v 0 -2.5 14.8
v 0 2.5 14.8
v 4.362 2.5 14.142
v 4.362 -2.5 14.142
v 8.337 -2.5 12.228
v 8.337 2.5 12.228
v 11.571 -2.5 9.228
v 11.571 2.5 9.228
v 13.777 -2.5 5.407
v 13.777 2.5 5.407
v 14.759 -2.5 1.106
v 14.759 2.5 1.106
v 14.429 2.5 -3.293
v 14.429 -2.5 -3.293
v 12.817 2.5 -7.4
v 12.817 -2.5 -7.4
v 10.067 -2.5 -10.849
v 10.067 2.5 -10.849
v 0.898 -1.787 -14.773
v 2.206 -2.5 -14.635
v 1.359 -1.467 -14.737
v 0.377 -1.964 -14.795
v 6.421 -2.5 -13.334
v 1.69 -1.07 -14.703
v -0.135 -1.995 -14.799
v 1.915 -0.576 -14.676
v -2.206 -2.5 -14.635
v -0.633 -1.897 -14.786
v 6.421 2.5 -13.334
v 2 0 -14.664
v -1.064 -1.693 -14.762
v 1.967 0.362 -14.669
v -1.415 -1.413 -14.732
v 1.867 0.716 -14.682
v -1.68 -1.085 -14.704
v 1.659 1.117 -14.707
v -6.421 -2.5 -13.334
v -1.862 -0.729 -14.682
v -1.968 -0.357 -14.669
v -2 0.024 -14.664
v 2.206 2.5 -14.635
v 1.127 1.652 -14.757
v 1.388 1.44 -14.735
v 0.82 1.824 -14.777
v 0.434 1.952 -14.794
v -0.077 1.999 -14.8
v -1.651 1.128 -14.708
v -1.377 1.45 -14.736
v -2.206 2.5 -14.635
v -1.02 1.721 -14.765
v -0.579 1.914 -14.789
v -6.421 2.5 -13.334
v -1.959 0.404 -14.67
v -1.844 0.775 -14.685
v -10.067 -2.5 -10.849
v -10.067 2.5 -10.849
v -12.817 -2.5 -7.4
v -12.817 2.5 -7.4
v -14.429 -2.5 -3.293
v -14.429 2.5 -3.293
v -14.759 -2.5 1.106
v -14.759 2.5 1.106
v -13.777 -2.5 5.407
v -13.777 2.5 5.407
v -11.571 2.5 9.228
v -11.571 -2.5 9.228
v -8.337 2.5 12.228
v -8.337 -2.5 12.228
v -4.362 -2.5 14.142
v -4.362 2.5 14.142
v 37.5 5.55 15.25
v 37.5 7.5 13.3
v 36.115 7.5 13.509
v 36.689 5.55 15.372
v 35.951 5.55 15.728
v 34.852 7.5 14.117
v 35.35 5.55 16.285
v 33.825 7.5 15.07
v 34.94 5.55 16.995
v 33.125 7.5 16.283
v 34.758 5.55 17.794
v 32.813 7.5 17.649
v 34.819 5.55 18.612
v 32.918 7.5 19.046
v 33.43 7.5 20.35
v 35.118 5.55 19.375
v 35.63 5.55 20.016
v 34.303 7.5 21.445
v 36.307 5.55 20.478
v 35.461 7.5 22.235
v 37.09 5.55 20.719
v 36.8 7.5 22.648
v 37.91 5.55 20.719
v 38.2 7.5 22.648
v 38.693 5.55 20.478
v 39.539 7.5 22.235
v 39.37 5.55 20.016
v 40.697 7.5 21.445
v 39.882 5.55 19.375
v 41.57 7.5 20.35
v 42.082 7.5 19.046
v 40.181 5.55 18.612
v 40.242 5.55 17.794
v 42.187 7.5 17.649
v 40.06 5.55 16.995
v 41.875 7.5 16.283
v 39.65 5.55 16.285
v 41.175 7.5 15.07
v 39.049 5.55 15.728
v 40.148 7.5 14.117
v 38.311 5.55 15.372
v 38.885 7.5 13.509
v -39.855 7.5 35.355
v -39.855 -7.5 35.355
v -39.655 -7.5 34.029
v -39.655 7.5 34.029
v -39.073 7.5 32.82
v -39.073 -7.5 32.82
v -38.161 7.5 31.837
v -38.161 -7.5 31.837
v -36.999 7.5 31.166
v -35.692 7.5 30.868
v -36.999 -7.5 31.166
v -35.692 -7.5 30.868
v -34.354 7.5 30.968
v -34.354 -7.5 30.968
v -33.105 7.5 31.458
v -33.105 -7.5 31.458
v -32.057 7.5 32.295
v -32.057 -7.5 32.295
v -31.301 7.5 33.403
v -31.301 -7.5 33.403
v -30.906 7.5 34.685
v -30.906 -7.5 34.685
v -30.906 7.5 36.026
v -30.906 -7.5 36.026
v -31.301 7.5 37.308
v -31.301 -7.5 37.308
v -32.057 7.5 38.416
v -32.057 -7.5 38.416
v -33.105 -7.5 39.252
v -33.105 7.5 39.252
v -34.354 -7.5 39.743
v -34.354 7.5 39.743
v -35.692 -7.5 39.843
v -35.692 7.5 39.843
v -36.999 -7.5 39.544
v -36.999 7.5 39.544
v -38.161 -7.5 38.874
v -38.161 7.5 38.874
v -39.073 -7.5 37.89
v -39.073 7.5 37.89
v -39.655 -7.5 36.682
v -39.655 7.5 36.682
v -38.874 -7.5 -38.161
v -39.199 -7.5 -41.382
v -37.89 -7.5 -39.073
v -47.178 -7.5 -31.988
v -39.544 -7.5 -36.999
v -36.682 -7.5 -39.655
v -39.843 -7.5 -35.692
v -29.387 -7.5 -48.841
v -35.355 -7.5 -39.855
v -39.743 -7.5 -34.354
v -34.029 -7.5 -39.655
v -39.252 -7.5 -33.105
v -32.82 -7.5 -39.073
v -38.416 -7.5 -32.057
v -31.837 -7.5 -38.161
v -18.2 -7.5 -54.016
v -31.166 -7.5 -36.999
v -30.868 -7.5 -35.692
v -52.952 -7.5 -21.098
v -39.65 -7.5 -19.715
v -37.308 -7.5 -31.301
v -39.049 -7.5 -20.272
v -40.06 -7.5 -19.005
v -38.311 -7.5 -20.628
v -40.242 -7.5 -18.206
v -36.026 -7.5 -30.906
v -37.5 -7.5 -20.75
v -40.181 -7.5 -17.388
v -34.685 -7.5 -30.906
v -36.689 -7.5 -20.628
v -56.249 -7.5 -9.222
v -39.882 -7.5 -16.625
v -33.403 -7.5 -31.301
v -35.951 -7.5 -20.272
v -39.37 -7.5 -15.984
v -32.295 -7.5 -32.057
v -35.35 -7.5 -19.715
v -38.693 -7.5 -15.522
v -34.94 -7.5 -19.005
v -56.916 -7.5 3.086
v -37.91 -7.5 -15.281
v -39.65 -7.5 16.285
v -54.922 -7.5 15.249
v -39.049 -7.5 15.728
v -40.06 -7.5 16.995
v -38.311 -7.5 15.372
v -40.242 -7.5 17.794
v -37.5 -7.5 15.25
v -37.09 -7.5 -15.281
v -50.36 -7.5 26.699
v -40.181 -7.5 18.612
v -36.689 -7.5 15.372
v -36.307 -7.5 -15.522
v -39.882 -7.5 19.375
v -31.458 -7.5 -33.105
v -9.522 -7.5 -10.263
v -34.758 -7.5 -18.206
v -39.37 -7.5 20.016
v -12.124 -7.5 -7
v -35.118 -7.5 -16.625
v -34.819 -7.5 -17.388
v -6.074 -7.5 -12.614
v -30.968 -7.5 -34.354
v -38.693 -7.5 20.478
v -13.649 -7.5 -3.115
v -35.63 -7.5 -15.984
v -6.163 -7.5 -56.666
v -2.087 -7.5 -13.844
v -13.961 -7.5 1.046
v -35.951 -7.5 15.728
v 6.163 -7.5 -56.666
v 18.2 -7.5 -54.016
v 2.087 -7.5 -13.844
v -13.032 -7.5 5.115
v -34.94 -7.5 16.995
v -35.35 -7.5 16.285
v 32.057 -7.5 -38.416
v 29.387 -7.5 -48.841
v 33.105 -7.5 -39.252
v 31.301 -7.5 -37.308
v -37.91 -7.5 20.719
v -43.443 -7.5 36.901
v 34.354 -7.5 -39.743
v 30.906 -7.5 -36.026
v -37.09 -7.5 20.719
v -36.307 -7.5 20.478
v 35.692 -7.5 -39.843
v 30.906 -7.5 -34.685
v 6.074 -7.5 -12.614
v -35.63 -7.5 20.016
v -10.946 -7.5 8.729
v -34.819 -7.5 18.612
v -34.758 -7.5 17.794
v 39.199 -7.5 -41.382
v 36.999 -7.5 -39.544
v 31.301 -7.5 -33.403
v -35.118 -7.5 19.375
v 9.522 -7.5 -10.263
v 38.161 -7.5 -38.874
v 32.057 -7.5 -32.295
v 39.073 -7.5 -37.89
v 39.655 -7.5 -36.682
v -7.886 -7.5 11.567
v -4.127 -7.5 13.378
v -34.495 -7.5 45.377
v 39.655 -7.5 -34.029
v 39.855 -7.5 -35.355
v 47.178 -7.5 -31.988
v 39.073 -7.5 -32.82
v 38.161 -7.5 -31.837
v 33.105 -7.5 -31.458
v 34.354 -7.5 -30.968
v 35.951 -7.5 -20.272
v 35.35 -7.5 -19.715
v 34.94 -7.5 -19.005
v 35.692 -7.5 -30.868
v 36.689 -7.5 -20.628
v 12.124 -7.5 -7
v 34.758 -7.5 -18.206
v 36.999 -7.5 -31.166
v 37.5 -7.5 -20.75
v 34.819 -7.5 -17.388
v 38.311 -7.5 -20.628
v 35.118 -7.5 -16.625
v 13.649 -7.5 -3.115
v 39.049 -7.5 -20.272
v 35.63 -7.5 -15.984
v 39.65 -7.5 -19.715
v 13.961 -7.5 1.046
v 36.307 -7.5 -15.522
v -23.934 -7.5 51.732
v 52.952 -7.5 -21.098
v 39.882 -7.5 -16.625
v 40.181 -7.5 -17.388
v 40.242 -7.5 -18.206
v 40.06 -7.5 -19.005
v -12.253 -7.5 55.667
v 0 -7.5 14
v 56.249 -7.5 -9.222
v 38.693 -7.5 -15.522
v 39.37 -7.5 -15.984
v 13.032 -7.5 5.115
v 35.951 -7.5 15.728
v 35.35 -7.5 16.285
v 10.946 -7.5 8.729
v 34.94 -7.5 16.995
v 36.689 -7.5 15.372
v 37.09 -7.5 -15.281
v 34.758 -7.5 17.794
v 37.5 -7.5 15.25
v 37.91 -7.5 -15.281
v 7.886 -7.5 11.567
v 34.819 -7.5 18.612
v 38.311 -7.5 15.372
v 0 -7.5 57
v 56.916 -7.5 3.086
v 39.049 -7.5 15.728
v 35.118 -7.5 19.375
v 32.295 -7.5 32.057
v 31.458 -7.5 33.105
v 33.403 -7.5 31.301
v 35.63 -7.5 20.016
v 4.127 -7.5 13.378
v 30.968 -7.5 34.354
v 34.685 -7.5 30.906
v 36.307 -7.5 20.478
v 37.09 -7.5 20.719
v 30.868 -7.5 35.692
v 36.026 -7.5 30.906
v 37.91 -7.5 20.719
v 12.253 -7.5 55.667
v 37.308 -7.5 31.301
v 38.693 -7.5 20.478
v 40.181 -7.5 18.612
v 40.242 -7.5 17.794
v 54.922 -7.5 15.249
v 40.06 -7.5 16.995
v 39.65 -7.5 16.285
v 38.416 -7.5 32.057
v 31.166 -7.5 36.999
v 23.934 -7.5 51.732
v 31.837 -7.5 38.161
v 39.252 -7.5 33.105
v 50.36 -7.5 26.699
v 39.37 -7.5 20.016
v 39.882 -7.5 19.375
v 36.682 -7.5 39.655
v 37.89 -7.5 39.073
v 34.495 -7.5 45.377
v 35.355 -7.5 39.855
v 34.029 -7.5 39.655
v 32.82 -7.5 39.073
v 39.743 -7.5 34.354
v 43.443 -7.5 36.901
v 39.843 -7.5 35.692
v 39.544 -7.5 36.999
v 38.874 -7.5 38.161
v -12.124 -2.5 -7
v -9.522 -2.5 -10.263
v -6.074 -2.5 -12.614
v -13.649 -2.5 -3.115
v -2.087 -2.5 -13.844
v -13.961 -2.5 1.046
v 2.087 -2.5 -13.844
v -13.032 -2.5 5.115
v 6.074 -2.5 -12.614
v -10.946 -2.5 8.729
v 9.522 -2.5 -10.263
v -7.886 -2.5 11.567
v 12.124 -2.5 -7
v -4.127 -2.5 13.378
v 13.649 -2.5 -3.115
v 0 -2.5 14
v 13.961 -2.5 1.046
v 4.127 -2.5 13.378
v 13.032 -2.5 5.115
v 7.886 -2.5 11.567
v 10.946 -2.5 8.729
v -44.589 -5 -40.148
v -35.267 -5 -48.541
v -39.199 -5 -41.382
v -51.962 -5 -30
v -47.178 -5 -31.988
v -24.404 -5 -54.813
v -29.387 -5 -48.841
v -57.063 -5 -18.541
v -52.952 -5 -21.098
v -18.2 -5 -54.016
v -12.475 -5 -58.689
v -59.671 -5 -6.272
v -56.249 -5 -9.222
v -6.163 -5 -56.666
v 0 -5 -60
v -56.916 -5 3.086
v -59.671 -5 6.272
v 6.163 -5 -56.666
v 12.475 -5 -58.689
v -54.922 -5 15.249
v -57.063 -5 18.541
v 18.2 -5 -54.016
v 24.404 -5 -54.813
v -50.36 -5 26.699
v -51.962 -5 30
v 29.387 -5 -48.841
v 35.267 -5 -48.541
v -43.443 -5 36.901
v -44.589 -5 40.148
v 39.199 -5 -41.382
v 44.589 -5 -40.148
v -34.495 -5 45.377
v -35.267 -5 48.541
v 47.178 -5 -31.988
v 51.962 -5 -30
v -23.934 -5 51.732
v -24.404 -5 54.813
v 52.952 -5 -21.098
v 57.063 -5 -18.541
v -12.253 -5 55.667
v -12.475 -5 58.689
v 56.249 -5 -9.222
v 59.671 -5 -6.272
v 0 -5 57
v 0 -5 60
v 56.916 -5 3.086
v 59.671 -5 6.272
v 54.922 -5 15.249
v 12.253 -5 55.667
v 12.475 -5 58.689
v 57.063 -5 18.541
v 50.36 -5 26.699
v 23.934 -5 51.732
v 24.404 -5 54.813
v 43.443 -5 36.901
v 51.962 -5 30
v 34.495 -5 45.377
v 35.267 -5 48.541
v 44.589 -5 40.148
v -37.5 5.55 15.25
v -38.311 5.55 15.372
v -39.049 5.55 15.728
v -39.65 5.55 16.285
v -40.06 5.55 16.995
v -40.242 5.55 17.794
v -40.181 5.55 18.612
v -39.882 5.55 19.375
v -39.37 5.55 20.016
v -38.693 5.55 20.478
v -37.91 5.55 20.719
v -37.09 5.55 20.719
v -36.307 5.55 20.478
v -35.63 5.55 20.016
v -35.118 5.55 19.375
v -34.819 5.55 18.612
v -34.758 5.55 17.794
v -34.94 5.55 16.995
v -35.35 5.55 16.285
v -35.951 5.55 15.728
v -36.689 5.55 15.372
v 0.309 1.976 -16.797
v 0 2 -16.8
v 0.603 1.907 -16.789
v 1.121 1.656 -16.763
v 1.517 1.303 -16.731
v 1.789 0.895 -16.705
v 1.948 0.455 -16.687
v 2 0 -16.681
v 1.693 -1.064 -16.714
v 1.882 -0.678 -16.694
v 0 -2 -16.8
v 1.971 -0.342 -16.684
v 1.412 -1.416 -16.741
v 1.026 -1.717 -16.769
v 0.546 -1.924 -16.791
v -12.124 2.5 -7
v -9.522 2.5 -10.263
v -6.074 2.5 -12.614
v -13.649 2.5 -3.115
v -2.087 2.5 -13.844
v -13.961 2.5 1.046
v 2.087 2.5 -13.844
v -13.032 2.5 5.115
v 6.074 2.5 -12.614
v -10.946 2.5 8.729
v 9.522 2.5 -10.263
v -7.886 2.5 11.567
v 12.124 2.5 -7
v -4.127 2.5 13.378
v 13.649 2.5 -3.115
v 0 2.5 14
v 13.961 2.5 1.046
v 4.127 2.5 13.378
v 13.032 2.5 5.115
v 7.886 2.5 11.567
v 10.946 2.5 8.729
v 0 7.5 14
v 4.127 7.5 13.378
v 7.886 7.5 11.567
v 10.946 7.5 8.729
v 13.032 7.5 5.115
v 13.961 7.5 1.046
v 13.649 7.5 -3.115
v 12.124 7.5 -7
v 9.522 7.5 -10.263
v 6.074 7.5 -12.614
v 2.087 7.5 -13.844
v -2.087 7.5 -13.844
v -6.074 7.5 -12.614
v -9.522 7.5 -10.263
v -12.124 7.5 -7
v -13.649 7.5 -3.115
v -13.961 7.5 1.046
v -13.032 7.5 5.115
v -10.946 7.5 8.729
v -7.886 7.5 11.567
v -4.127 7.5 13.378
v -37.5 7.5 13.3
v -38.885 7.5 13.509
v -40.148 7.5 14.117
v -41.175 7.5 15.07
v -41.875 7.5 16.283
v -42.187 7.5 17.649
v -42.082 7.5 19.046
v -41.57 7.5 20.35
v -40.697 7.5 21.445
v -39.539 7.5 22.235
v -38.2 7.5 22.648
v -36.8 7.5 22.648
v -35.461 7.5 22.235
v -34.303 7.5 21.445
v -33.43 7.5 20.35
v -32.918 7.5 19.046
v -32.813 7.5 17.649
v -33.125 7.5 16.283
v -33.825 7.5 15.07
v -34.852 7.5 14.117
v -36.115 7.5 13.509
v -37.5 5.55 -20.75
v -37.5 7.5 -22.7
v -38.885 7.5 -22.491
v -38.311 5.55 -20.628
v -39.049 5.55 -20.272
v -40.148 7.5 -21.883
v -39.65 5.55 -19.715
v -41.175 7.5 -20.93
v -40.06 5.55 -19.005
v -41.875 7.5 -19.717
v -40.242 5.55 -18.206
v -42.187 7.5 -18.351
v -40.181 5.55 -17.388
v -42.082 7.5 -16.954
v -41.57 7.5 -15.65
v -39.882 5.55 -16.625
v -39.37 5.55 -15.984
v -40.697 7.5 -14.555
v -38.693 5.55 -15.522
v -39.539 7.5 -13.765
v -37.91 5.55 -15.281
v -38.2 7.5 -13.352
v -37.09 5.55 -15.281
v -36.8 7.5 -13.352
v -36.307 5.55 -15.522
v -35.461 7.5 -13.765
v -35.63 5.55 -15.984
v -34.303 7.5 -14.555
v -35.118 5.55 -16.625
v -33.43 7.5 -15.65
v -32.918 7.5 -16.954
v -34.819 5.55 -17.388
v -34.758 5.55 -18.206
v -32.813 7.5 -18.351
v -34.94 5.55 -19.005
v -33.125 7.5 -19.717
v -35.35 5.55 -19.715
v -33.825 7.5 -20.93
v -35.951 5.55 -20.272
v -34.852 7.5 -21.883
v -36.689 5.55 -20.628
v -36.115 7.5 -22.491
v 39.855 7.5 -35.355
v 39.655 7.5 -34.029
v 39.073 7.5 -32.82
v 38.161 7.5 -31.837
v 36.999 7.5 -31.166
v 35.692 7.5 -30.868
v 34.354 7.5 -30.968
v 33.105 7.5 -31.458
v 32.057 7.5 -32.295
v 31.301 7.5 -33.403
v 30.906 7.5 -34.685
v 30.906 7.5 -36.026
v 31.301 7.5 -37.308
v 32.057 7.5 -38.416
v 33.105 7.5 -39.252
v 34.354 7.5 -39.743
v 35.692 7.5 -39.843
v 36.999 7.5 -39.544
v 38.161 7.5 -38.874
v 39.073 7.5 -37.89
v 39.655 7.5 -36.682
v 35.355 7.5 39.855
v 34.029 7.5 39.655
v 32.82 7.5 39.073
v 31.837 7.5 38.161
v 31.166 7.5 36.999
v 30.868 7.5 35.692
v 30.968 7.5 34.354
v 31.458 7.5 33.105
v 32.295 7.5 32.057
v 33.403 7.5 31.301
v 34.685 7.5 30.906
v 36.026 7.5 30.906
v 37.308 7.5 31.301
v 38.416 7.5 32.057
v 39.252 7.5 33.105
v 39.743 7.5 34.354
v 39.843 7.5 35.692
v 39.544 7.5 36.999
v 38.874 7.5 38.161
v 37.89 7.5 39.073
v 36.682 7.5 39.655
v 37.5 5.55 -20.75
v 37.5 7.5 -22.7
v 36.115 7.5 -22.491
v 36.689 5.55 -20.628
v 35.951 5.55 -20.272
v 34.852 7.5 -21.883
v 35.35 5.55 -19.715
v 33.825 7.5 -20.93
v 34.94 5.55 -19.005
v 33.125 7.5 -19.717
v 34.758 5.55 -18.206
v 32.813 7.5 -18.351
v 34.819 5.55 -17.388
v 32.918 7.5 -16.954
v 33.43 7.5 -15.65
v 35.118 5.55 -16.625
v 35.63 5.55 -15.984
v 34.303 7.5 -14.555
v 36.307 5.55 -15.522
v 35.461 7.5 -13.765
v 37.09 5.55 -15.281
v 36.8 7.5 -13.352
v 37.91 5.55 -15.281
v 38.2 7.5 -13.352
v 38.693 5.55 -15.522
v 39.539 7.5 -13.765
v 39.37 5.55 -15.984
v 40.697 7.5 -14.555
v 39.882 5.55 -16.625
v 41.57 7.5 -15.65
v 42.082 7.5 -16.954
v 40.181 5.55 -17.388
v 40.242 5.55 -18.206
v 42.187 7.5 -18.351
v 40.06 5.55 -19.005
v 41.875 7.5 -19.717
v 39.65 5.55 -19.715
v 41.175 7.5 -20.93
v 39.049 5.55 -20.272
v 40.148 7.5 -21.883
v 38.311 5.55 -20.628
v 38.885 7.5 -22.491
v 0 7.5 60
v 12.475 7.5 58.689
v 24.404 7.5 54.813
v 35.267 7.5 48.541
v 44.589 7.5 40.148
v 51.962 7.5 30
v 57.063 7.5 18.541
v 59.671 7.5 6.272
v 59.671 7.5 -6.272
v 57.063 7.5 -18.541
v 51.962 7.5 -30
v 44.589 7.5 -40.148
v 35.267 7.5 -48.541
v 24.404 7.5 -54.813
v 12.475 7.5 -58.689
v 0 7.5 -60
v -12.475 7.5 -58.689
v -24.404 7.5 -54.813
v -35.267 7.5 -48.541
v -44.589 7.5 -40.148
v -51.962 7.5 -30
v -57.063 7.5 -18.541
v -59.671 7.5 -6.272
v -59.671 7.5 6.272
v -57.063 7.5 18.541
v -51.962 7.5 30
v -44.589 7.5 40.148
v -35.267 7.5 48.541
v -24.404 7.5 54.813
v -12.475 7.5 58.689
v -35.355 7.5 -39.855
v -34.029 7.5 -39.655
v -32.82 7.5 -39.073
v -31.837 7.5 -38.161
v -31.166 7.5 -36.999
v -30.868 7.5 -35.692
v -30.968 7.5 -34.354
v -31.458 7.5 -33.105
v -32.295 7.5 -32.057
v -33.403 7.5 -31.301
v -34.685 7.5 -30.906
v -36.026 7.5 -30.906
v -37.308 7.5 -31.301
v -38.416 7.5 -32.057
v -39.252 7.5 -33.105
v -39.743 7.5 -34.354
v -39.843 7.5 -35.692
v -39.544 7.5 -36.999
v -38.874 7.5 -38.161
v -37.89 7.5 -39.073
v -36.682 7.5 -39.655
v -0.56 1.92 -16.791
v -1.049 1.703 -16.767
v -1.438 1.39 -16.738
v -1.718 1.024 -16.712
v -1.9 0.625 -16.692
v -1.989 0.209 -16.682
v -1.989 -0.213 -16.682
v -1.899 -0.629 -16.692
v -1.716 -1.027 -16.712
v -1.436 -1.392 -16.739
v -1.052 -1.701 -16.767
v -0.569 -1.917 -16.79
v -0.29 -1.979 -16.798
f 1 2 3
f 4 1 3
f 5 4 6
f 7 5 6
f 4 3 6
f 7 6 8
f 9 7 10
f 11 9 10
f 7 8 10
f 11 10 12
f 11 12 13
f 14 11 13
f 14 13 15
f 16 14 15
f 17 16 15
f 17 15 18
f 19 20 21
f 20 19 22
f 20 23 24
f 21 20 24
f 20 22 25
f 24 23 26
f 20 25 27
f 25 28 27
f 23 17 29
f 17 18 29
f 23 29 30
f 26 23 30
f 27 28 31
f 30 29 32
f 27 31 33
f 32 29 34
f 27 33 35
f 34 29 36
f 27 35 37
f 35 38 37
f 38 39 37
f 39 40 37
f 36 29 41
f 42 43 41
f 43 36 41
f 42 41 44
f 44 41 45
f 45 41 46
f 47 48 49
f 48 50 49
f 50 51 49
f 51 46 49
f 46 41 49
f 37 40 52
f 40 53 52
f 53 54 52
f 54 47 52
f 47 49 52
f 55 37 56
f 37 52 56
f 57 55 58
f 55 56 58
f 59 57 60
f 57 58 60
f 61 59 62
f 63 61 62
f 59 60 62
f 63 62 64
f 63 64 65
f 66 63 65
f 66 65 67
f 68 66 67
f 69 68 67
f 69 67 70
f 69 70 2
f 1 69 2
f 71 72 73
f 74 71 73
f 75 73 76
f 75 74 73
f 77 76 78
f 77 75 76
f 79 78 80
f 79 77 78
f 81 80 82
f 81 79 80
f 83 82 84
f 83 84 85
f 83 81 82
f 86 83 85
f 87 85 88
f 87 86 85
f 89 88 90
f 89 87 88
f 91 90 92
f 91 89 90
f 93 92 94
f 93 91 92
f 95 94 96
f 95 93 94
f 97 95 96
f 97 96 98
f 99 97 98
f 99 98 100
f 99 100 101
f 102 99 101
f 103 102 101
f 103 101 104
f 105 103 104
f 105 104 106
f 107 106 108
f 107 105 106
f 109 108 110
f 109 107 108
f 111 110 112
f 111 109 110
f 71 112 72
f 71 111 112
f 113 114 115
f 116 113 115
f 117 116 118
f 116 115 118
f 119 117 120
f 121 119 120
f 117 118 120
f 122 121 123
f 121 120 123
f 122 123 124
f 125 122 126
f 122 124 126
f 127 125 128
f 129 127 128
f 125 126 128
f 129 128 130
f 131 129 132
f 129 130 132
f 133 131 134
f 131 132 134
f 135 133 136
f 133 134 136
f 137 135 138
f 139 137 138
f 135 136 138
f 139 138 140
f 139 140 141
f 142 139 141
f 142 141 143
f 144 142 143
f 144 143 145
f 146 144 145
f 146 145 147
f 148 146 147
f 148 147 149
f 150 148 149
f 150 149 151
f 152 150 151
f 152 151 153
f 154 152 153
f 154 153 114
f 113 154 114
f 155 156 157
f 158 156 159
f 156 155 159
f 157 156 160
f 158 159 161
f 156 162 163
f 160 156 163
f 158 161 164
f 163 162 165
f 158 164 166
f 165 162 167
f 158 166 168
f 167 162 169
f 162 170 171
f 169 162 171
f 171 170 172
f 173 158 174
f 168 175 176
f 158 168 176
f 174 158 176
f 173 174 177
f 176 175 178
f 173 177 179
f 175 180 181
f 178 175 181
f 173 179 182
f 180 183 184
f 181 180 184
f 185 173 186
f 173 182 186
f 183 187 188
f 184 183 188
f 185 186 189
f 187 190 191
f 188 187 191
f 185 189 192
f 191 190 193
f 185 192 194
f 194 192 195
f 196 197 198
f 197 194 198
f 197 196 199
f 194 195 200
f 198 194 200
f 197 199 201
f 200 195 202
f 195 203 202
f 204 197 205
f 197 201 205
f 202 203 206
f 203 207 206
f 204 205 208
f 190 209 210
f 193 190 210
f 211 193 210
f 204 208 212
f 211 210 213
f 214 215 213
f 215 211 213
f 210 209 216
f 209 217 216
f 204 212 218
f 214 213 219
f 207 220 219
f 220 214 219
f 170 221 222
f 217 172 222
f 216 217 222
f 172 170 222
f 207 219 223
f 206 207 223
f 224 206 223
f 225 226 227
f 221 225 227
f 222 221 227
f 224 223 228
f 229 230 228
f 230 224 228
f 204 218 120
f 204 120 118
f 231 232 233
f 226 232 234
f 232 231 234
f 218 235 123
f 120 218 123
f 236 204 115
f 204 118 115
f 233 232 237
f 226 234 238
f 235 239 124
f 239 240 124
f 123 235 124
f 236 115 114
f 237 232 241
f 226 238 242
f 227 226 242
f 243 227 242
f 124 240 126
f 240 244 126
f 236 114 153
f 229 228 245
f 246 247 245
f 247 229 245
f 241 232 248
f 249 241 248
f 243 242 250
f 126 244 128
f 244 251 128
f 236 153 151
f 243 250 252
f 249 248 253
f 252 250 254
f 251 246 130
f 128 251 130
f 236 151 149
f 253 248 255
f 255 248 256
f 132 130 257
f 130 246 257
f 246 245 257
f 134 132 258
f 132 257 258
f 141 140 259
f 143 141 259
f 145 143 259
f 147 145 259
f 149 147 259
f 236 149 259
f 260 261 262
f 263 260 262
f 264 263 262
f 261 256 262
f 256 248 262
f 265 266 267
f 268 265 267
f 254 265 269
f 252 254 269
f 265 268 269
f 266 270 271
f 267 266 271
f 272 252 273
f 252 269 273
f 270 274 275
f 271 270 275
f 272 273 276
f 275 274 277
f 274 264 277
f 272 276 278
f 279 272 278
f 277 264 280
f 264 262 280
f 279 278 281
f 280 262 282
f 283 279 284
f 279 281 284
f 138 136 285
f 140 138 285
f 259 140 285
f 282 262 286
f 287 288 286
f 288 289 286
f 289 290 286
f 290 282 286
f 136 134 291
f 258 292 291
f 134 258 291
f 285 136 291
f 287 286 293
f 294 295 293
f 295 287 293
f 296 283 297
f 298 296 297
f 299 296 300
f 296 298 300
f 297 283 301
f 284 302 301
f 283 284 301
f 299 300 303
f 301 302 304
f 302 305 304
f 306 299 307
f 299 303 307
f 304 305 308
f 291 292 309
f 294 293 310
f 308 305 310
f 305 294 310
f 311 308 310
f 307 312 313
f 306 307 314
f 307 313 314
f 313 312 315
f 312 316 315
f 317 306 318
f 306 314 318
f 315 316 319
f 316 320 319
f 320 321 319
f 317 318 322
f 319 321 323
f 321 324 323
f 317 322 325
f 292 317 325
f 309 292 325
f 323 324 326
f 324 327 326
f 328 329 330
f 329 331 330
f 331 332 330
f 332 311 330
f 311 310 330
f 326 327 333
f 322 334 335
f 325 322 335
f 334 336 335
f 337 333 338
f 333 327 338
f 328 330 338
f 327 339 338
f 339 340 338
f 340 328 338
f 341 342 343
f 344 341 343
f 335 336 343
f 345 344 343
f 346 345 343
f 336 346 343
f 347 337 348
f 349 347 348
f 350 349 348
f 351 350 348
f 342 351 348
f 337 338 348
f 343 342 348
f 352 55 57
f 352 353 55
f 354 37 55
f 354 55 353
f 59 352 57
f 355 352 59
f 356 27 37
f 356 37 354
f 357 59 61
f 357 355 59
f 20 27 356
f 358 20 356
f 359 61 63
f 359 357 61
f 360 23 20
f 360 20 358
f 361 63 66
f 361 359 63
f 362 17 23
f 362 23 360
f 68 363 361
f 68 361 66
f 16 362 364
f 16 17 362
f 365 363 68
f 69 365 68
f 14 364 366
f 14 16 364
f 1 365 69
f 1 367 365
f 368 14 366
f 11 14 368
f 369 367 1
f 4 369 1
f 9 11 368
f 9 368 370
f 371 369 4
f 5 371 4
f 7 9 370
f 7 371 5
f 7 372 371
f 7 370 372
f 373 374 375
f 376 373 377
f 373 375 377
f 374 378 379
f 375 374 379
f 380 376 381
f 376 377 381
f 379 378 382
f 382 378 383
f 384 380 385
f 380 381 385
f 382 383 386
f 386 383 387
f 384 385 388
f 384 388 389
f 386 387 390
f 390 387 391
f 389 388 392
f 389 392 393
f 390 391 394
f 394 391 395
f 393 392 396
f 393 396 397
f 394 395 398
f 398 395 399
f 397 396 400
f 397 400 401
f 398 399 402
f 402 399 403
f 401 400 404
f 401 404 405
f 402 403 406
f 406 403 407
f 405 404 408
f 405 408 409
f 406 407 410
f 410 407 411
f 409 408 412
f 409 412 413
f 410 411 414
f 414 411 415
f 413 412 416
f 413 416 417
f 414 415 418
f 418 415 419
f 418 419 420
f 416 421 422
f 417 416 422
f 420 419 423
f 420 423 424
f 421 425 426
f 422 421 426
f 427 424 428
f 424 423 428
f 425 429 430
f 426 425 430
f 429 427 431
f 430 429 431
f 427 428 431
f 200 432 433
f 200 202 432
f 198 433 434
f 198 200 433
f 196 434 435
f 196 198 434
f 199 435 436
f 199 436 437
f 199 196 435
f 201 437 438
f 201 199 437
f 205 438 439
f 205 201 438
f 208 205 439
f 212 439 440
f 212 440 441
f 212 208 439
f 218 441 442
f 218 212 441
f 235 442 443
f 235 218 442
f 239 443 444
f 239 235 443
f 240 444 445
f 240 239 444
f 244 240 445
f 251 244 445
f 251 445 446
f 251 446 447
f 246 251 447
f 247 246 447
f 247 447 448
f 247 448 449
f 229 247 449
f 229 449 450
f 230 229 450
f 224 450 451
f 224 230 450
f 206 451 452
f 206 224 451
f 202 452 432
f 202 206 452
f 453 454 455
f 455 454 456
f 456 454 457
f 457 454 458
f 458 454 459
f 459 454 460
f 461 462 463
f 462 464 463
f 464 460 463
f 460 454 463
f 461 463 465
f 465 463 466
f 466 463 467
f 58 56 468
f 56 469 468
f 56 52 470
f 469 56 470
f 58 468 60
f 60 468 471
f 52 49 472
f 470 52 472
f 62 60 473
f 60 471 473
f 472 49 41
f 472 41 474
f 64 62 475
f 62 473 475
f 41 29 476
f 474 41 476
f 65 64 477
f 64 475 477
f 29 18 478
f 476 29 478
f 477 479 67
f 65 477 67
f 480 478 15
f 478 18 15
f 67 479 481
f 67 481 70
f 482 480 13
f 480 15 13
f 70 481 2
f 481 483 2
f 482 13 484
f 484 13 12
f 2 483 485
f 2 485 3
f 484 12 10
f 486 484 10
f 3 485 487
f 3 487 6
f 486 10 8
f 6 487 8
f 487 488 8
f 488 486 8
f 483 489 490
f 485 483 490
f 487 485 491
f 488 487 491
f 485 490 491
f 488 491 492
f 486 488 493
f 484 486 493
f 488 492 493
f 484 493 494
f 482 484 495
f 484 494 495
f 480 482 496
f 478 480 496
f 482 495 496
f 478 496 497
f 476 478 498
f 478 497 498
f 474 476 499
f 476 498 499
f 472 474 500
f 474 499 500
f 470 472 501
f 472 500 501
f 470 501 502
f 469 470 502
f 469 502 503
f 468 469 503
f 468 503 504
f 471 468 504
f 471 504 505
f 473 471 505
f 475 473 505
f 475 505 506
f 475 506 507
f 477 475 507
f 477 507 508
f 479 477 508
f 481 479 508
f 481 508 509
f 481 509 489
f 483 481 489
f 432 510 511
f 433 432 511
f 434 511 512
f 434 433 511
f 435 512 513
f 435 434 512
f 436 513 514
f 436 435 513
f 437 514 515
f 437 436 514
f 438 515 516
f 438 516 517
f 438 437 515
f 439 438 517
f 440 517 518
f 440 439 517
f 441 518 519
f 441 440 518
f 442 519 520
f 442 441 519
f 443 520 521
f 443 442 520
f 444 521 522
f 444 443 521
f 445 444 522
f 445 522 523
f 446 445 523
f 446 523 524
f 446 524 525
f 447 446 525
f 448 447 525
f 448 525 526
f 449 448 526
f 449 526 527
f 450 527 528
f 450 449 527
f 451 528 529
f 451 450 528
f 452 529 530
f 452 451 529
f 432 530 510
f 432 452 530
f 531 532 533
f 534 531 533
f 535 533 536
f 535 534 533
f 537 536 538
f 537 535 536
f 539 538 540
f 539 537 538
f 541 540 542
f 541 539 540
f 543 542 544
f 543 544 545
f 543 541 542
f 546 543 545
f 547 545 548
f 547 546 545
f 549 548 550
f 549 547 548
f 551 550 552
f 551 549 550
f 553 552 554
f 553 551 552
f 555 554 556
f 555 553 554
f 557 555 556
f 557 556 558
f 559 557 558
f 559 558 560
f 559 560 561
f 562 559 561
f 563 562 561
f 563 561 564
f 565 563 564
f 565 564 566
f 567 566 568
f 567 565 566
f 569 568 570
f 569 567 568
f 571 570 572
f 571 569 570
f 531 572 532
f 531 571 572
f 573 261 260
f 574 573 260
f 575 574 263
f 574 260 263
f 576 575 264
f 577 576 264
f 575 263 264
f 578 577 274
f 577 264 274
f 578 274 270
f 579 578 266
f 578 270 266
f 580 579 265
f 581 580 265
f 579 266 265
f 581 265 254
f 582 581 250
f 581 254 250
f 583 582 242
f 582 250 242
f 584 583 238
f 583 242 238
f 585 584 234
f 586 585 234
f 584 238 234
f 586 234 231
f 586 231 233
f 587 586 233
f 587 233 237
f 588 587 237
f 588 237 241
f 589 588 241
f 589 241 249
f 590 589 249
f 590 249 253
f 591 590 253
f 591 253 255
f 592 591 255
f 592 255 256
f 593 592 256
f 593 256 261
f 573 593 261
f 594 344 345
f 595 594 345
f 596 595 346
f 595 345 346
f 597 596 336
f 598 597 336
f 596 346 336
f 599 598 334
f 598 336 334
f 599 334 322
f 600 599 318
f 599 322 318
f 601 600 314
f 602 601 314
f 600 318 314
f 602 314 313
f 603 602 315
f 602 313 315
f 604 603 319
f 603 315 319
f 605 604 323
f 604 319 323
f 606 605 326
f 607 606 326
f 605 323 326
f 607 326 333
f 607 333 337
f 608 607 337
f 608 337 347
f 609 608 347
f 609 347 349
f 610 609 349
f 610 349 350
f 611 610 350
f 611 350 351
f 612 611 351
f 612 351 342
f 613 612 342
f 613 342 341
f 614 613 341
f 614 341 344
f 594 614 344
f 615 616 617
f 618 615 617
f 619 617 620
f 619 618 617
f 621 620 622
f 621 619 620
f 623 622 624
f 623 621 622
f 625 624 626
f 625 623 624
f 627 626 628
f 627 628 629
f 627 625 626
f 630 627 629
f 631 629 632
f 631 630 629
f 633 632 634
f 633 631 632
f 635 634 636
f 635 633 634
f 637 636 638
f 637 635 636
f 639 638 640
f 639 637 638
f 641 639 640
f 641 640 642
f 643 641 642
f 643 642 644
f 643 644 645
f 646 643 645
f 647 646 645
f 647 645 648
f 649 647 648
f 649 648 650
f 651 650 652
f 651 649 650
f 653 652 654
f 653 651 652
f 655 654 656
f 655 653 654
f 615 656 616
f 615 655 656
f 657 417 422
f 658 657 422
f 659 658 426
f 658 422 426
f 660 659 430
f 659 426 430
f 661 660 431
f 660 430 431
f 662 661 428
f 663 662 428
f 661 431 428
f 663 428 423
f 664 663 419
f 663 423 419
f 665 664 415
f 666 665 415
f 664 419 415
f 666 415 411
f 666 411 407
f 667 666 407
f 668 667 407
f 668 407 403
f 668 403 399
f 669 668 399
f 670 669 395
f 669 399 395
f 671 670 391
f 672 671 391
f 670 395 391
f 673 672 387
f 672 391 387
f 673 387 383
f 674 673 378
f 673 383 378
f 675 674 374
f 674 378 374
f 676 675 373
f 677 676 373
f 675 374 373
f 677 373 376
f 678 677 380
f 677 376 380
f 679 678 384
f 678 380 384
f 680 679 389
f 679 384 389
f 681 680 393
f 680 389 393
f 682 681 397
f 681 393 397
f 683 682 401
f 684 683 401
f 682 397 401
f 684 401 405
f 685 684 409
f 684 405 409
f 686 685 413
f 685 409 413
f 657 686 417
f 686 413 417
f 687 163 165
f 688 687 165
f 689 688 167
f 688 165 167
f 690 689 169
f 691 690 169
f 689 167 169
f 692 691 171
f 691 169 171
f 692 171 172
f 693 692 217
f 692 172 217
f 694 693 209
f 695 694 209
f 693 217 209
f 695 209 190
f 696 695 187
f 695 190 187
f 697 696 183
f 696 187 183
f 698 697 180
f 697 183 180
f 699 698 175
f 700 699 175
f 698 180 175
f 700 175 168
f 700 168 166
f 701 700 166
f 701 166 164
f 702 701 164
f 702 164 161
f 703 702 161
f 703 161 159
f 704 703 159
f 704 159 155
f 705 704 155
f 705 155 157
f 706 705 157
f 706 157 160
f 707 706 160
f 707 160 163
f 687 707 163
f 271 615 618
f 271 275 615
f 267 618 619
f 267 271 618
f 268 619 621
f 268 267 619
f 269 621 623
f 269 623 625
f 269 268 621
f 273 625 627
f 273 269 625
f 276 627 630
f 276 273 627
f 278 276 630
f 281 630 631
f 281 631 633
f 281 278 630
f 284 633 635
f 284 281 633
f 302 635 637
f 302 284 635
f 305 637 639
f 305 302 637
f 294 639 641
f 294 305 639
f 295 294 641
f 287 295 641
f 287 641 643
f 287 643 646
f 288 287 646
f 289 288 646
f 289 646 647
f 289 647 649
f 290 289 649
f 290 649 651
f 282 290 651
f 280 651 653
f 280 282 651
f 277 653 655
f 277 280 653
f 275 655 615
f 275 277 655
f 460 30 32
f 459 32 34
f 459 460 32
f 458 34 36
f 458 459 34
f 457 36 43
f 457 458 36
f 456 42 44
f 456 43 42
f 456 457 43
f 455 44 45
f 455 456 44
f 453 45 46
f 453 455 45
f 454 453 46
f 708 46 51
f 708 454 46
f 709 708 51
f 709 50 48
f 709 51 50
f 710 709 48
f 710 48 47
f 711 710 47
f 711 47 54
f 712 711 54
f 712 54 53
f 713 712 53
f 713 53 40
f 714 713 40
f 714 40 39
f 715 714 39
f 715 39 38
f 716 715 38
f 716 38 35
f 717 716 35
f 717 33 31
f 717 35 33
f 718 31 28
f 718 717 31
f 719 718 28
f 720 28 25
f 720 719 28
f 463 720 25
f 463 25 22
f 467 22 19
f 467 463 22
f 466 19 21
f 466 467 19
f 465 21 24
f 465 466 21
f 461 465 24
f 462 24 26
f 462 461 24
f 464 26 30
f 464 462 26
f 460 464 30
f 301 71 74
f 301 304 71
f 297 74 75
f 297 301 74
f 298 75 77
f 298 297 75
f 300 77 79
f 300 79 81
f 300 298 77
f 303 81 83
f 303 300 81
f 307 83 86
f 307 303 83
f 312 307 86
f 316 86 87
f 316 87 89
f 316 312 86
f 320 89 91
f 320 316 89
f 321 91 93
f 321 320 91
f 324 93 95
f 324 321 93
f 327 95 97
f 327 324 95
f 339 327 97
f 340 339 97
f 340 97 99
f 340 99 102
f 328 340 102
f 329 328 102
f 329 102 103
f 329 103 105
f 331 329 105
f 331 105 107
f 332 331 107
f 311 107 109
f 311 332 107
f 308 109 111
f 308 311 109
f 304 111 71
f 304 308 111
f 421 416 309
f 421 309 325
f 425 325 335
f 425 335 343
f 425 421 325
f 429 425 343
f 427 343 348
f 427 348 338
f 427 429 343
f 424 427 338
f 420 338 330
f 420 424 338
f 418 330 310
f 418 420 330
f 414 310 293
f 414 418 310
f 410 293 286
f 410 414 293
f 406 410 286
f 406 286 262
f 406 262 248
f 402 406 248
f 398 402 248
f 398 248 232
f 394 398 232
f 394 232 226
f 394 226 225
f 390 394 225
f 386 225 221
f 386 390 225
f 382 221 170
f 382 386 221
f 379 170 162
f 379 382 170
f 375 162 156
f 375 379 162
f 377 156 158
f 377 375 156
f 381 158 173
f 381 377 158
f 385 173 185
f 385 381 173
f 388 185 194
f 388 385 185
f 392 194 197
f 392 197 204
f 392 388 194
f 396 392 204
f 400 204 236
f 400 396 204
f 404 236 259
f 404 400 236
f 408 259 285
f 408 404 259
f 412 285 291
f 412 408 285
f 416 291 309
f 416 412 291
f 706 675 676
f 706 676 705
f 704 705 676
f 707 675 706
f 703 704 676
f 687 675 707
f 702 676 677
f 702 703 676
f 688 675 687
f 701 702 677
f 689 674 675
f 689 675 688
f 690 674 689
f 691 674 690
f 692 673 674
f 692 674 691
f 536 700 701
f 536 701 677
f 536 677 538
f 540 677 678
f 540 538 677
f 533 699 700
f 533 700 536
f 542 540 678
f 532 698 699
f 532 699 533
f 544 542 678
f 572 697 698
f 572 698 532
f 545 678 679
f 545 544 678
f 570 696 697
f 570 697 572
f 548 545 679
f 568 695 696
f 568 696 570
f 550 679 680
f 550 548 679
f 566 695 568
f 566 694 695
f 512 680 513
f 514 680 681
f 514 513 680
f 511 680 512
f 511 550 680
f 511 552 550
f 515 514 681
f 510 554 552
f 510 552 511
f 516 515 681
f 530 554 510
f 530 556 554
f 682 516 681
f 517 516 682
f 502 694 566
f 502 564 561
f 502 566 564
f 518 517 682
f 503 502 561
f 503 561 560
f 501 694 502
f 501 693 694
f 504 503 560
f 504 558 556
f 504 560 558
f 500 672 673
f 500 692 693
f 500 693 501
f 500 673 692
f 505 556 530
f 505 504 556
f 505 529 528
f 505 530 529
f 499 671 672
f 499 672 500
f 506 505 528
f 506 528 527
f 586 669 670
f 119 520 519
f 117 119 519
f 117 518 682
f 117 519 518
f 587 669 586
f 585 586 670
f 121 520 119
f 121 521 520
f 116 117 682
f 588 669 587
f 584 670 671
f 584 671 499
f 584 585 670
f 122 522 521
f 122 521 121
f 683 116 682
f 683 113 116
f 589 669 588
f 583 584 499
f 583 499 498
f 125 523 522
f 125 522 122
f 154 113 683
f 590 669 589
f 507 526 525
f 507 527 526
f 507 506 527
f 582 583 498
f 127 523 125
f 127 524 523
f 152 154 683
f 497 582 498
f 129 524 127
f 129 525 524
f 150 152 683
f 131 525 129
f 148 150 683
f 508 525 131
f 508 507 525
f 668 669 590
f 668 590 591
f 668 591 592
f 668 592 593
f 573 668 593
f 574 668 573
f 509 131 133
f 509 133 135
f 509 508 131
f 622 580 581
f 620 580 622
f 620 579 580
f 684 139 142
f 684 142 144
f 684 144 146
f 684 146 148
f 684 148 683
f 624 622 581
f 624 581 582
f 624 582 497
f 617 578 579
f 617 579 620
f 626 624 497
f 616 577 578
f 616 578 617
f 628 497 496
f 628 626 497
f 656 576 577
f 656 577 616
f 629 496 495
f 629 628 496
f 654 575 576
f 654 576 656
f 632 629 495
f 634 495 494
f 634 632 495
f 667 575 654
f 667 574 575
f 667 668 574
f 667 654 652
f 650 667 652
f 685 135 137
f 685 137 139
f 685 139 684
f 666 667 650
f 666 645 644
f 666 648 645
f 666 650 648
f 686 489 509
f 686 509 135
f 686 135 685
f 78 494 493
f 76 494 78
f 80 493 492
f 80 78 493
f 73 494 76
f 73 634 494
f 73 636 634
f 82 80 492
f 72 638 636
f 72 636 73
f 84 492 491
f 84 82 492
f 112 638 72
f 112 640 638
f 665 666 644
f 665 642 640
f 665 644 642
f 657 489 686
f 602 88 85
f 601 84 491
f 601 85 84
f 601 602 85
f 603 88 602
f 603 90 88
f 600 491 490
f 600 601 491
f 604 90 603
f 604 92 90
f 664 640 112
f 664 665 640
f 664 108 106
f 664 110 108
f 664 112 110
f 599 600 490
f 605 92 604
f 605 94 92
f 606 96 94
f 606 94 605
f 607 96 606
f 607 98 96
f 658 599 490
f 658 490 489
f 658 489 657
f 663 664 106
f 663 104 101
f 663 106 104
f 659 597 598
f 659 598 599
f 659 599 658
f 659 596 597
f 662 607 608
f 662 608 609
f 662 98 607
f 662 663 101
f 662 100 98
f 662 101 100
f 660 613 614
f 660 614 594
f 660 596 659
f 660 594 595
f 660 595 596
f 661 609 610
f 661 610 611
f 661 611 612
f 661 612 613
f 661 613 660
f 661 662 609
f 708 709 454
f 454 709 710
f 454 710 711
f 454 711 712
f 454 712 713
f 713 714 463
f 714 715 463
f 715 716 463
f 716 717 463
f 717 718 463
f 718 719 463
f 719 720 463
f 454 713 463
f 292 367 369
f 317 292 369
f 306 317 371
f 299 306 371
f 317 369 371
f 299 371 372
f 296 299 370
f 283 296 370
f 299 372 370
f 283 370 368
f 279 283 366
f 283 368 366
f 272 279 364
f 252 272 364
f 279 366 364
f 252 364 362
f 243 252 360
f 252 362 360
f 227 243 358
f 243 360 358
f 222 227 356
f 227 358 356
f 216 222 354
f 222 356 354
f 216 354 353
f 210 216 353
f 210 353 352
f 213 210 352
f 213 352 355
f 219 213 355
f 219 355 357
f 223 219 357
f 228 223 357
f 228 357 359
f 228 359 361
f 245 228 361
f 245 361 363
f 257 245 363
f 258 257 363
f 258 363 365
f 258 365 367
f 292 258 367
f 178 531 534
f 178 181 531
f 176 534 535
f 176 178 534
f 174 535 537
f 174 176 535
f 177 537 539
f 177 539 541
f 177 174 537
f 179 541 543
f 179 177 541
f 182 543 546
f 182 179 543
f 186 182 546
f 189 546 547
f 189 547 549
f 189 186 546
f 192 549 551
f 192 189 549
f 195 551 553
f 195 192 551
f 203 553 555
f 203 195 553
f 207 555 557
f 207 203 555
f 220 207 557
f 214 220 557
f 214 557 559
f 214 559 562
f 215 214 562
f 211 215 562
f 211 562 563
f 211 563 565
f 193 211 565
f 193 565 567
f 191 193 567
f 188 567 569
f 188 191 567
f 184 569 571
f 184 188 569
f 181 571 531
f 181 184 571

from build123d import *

# Parameters (mm, degrees)
SKETCH1_R                     = 57
EXTRUDE4_DEPTH                = 7.5
EXTRUDE5_DEPTH                = 7.5
EXTRUDE5_DEPTH_BACK           = 5
SKETCH_R                      = 60
SKETCH_R_2                    = 57
SKETCH2_R                     = 14
EXTRUDE6_DEPTH                = 87.168439698
SKETCH6_R                     = 14.8
EXTRUDE7_DEPTH                = 2.5
EXTRUDE8_START                = -16.8000001
EXTRUDE8_OUTLINE_R            = 2
EXTRUDE8_DEPTH                = 2.135757978
EXTRUDE8_START_2              = -3
EXTRUDE8_2_DEPTH              = 6
M8_CLEARANCE_HOLE1_D          = 9
CIRPATTERN1_COUNT             = 4
M5_CLEARANCE_HOLE1_AT_2_COUNT = 2
M5_CLEARANCE_HOLE1_AT_2_PITCH = 36
M5_CLEARANCE_HOLE1_AT_3_COUNT = 2
M5_CLEARANCE_HOLE1_AT_3_PITCH = 83.192547743
M5_CLEARANCE_HOLE1_AT_4_COUNT = 2
M5_CLEARANCE_HOLE1_AT_4_PITCH = 75


with BuildPart() as part:
    # Sketch1 → Extrude4 (new, symmetric)
    with BuildSketch(Plane(origin=(0, 0, 0), x_dir=(1, 0, 0), z_dir=(0, 1, 0))):
        with Locations(Location((0, 0, 0), (0, 0, 270))):
            Circle(SKETCH1_R)
    extrude(amount=EXTRUDE4_DEPTH, both=True)

    # Sketch → Extrude5 (add, two sides: drawn at the far end of the back side and taken through both)
    with BuildSketch(Plane(origin=(0, 0, 0), x_dir=(1, 0, 0), z_dir=(0, 1, 0)).offset(-EXTRUDE5_DEPTH_BACK)):
        with Locations(Location((0, 0, 0), (0, 0, 270))):
            Circle(SKETCH_R)
        with Locations(Location((0, 0, 0), (0, 0, 270))):
            Circle(SKETCH_R_2, mode=Mode.SUBTRACT)
    extrude(amount=EXTRUDE5_DEPTH + EXTRUDE5_DEPTH_BACK)

    # Sketch2 → Extrude6 (cut, through all)
    with BuildSketch(Plane(origin=(0, 7.5, 0), x_dir=(1, 0, 0), z_dir=(0, 1, 0))):
        with Locations(Location((0, 0, 0), (0, 0, 270))):
            Circle(SKETCH2_R)
    extrude(amount=-EXTRUDE6_DEPTH, mode=Mode.SUBTRACT)

    # Sketch6 → Extrude7 (cut, symmetric)
    with BuildSketch(Plane(origin=(0, 0, 0), x_dir=(1, 0, 0), z_dir=(0, 1, 0))):
        with Locations(Location((0, 0, 0), (0, 0, 270))):
            Circle(SKETCH6_R)
    extrude(amount=EXTRUDE7_DEPTH, both=True, mode=Mode.SUBTRACT)

    # Extrude8: read off the stored shape, not the designer's step
    # Extrude8 outline → Extrude8 (cut)
    with BuildSketch(Plane.XY.offset(EXTRUDE8_START)):
        Circle(EXTRUDE8_OUTLINE_R)
    extrude(amount=EXTRUDE8_DEPTH, mode=Mode.SUBTRACT)

    # Extrude8 2 outline → Extrude8 2 (add)
    with BuildSketch(Plane(origin=(0, 0, 0), x_dir=(1, 0, 0), z_dir=(0, 1, 0)).offset(EXTRUDE8_START_2)):
        with BuildLine():
            ThreePointArc((-2e-09, 16.8), (1.002059984, 16.770088723), (2.000551768, 16.680461403))
            Line((2.000551768, 16.680461403), (3, 16.56059374))
            Line((3, 16.56059374), (3, 16.8000001))
            Line((3, 16.8000001), (-2e-09, 16.8))
        make_face()
        with BuildLine():
            ThreePointArc((-2.000001192, 16.680527427), (-1.001783219, 16.770105259), (-2e-09, 16.8))
            Line((-2e-09, 16.8), (-3, 16.8000001))
            Line((-3, 16.8000001), (-3, 16.560627213))
            Line((-3, 16.560627213), (-2.000001192, 16.680527427))
        make_face()
    extrude(amount=EXTRUDE8_2_DEPTH)

    # M8 Clearance Hole1 (through all)
    with Locations(Plane(origin=(0, 7.5, 0), x_dir=(1, 0, 0), z_dir=(0, 1, 0))):
        with Locations((-35.355339059, -35.355339059)):
            m8_clearance_hole1 = Hole(M8_CLEARANCE_HOLE1_D / 2)

    # CirPattern1: M8 Clearance Hole1 ×4 about axis
    cirpattern1_axis = Axis((0, 0, 0), (0, 1, 0))
    for i in range(1, CIRPATTERN1_COUNT):
        add(m8_clearance_hole1.rotate(cirpattern1_axis, i * 360 / CIRPATTERN1_COUNT), mode=Mode.SUBTRACT)

    # Sketch10 → M5 Clearance Hole1 (revolve, cut)
    with BuildSketch(Plane(origin=(37.5, -7.5, 18), x_dir=(0, 0, -1), z_dir=(1, 0, 0))):
        Polygon((0, 0), (0, 15), (4.7, 15), (2.75, 13.05), (2.75, 0), align=None)
    m5_clearance_hole1 = revolve(axis=Axis((37.5, -13.85, 18), (0, 1, 0)), mode=Mode.SUBTRACT)

    # M5 Clearance Hole1 at 2: M5 Clearance Hole1 ×2
    with Locations(*[(0, 0, -i * M5_CLEARANCE_HOLE1_AT_2_PITCH) for i in range(1, M5_CLEARANCE_HOLE1_AT_2_COUNT)]):
        add(m5_clearance_hole1, mode=Mode.SUBTRACT)

    # M5 Clearance Hole1 at 3: M5 Clearance Hole1 ×2
    with Locations(*[Vector(-0.9015230574682735, 0, -0.4327310675847715) * (i * M5_CLEARANCE_HOLE1_AT_3_PITCH) for i in range(1, M5_CLEARANCE_HOLE1_AT_3_COUNT)]):
        add(m5_clearance_hole1, mode=Mode.SUBTRACT)

    # M5 Clearance Hole1 at 4: M5 Clearance Hole1 ×2
    with Locations(*[(-i * M5_CLEARANCE_HOLE1_AT_4_PITCH, 0, 0) for i in range(1, M5_CLEARANCE_HOLE1_AT_4_COUNT)]):
        add(m5_clearance_hole1, mode=Mode.SUBTRACT)


solid = part.part
